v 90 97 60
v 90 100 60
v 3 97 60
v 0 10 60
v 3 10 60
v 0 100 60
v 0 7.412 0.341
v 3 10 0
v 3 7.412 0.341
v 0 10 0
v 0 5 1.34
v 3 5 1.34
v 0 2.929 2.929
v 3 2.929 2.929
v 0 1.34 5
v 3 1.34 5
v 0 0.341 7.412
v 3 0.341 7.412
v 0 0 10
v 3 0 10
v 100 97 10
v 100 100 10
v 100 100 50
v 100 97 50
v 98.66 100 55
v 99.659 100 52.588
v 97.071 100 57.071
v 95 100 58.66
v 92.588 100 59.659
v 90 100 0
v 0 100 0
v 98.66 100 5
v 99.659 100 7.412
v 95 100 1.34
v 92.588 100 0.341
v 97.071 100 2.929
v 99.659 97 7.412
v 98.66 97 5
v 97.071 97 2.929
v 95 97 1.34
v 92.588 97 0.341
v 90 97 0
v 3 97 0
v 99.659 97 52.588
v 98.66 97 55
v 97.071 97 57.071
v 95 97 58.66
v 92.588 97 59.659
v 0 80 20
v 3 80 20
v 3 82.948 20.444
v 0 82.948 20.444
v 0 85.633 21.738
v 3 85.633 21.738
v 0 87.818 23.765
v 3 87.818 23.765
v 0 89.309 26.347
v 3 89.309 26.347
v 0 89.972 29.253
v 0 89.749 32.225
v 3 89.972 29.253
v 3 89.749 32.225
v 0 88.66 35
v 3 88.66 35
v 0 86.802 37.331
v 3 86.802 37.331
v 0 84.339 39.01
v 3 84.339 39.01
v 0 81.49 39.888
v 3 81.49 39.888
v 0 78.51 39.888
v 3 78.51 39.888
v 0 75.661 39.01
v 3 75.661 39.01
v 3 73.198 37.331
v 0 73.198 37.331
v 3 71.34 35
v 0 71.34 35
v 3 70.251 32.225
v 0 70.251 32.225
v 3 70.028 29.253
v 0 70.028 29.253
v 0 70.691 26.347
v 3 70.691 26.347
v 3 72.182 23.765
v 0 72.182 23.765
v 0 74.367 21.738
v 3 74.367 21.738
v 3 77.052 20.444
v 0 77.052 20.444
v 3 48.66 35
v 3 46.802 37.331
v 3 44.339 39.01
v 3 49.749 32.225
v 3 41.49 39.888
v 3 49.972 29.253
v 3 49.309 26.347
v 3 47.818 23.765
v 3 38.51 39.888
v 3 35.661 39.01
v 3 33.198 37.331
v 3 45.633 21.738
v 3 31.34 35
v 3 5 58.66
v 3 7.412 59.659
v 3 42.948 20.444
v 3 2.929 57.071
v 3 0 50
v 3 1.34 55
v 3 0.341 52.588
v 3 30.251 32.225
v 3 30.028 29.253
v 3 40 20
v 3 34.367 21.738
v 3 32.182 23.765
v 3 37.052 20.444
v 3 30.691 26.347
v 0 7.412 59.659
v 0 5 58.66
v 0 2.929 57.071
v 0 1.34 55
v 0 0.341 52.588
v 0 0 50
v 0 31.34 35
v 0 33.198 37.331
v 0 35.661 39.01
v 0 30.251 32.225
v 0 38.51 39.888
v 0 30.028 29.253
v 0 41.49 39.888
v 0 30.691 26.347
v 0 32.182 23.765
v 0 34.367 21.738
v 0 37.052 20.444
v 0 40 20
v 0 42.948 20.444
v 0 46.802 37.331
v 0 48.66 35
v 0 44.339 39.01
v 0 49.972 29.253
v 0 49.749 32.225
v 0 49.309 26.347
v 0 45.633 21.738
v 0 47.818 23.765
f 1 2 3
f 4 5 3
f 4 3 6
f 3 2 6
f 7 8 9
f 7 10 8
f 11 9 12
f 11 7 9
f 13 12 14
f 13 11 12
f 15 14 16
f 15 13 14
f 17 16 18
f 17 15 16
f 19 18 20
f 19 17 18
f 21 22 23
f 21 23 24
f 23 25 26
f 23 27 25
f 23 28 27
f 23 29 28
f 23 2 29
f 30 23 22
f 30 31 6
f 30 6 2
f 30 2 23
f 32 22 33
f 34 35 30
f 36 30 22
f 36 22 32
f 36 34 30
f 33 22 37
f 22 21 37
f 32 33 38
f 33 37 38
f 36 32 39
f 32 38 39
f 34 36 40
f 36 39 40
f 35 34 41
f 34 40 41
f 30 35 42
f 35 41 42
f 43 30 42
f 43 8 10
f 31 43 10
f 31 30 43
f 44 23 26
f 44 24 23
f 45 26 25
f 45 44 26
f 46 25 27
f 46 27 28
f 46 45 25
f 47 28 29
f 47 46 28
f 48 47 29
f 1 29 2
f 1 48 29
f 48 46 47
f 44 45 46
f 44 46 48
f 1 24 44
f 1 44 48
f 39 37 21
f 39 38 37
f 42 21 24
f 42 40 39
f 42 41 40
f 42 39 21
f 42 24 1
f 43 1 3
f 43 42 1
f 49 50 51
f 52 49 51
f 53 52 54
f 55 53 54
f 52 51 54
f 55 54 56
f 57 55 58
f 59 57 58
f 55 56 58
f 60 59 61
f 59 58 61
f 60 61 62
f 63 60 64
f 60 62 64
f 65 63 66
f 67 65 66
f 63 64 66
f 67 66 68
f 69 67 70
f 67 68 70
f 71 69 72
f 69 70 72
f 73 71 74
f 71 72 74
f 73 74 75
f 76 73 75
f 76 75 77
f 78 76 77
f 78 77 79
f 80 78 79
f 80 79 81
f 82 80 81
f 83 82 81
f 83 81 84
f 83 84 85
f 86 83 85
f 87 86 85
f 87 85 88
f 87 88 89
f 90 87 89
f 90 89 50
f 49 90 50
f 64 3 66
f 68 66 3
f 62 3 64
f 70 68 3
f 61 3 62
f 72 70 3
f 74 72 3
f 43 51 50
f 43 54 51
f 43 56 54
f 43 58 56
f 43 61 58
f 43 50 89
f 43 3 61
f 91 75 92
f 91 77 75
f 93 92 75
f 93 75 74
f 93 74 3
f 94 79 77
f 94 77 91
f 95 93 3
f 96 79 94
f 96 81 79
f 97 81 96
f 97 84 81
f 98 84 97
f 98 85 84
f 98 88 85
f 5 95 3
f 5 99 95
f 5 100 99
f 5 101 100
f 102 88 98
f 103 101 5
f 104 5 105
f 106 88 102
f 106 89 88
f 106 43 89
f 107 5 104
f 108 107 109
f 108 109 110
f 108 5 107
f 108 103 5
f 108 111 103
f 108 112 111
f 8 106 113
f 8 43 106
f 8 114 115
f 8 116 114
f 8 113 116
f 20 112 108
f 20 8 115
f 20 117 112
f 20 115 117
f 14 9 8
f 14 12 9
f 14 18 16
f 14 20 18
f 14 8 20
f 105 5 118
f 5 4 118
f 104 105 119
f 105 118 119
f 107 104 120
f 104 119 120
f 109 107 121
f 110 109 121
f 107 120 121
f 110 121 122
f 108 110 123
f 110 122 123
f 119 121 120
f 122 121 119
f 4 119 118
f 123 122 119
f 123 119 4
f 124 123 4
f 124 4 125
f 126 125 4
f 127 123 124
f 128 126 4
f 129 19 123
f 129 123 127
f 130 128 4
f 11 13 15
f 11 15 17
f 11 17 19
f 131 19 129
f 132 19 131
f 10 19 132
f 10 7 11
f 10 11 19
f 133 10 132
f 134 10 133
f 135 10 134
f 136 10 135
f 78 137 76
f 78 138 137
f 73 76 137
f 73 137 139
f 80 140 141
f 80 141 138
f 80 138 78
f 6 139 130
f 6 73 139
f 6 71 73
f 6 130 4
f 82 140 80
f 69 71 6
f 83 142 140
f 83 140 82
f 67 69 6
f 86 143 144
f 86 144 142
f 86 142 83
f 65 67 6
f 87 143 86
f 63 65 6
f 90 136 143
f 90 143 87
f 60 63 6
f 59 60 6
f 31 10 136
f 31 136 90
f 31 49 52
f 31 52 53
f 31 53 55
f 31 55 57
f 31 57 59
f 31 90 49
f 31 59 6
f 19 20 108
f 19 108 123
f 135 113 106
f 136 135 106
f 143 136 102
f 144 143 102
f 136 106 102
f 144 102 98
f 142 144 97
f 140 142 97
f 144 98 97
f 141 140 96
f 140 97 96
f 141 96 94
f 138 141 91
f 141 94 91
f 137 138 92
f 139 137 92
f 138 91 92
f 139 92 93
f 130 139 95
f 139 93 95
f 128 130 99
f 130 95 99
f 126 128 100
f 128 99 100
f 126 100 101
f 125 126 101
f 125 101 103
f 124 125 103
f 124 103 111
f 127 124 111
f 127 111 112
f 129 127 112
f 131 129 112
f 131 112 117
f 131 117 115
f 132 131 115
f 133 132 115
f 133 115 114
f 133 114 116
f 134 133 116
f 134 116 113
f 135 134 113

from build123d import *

# Parameters (mm, degrees)
BOSS_EXTRUDE1_DEPTH = 60
FILLET1_R           = 10
FILLET2_R           = 10
SKETCH2_R           = 10
CUT_EXTRUDE1_DEPTH  = 60


with BuildPart() as part:
    # Sketch1 → Boss-Extrude1 (new body)
    with BuildSketch(Plane.XY):
        Polygon((0, 0), (0, 100), (100, 100), (100, 97), (3, 97), (3, 0), align=None)
    extrude(amount=BOSS_EXTRUDE1_DEPTH)

    # Fillet1
    fillet1_edges = [part.edges().sort_by_distance(p)[0] for p in [
        (100, 98.5, 60),
        (100, 98.5, 0),
    ]]
    fillet(fillet1_edges, radius=FILLET1_R)

    # Fillet2
    fillet2_edges = [part.edges().sort_by_distance(p)[0] for p in [
        (1.5, 0, 60),
        (1.5, 0, 0),
    ]]
    fillet(fillet2_edges, radius=FILLET2_R)

    # Sketch2 → Cut-Extrude1 (cut)
    with BuildSketch(Plane(origin=(3, 0, 0), x_dir=(0, 0, -1), z_dir=(1, 0, 0))):
        with Locations((-30, 40)):
            Circle(SKETCH2_R)
        with Locations((-30, 80)):
            Circle(SKETCH2_R)
    extrude(amount=-CUT_EXTRUDE1_DEPTH, mode=Mode.SUBTRACT)


solid = part.part
